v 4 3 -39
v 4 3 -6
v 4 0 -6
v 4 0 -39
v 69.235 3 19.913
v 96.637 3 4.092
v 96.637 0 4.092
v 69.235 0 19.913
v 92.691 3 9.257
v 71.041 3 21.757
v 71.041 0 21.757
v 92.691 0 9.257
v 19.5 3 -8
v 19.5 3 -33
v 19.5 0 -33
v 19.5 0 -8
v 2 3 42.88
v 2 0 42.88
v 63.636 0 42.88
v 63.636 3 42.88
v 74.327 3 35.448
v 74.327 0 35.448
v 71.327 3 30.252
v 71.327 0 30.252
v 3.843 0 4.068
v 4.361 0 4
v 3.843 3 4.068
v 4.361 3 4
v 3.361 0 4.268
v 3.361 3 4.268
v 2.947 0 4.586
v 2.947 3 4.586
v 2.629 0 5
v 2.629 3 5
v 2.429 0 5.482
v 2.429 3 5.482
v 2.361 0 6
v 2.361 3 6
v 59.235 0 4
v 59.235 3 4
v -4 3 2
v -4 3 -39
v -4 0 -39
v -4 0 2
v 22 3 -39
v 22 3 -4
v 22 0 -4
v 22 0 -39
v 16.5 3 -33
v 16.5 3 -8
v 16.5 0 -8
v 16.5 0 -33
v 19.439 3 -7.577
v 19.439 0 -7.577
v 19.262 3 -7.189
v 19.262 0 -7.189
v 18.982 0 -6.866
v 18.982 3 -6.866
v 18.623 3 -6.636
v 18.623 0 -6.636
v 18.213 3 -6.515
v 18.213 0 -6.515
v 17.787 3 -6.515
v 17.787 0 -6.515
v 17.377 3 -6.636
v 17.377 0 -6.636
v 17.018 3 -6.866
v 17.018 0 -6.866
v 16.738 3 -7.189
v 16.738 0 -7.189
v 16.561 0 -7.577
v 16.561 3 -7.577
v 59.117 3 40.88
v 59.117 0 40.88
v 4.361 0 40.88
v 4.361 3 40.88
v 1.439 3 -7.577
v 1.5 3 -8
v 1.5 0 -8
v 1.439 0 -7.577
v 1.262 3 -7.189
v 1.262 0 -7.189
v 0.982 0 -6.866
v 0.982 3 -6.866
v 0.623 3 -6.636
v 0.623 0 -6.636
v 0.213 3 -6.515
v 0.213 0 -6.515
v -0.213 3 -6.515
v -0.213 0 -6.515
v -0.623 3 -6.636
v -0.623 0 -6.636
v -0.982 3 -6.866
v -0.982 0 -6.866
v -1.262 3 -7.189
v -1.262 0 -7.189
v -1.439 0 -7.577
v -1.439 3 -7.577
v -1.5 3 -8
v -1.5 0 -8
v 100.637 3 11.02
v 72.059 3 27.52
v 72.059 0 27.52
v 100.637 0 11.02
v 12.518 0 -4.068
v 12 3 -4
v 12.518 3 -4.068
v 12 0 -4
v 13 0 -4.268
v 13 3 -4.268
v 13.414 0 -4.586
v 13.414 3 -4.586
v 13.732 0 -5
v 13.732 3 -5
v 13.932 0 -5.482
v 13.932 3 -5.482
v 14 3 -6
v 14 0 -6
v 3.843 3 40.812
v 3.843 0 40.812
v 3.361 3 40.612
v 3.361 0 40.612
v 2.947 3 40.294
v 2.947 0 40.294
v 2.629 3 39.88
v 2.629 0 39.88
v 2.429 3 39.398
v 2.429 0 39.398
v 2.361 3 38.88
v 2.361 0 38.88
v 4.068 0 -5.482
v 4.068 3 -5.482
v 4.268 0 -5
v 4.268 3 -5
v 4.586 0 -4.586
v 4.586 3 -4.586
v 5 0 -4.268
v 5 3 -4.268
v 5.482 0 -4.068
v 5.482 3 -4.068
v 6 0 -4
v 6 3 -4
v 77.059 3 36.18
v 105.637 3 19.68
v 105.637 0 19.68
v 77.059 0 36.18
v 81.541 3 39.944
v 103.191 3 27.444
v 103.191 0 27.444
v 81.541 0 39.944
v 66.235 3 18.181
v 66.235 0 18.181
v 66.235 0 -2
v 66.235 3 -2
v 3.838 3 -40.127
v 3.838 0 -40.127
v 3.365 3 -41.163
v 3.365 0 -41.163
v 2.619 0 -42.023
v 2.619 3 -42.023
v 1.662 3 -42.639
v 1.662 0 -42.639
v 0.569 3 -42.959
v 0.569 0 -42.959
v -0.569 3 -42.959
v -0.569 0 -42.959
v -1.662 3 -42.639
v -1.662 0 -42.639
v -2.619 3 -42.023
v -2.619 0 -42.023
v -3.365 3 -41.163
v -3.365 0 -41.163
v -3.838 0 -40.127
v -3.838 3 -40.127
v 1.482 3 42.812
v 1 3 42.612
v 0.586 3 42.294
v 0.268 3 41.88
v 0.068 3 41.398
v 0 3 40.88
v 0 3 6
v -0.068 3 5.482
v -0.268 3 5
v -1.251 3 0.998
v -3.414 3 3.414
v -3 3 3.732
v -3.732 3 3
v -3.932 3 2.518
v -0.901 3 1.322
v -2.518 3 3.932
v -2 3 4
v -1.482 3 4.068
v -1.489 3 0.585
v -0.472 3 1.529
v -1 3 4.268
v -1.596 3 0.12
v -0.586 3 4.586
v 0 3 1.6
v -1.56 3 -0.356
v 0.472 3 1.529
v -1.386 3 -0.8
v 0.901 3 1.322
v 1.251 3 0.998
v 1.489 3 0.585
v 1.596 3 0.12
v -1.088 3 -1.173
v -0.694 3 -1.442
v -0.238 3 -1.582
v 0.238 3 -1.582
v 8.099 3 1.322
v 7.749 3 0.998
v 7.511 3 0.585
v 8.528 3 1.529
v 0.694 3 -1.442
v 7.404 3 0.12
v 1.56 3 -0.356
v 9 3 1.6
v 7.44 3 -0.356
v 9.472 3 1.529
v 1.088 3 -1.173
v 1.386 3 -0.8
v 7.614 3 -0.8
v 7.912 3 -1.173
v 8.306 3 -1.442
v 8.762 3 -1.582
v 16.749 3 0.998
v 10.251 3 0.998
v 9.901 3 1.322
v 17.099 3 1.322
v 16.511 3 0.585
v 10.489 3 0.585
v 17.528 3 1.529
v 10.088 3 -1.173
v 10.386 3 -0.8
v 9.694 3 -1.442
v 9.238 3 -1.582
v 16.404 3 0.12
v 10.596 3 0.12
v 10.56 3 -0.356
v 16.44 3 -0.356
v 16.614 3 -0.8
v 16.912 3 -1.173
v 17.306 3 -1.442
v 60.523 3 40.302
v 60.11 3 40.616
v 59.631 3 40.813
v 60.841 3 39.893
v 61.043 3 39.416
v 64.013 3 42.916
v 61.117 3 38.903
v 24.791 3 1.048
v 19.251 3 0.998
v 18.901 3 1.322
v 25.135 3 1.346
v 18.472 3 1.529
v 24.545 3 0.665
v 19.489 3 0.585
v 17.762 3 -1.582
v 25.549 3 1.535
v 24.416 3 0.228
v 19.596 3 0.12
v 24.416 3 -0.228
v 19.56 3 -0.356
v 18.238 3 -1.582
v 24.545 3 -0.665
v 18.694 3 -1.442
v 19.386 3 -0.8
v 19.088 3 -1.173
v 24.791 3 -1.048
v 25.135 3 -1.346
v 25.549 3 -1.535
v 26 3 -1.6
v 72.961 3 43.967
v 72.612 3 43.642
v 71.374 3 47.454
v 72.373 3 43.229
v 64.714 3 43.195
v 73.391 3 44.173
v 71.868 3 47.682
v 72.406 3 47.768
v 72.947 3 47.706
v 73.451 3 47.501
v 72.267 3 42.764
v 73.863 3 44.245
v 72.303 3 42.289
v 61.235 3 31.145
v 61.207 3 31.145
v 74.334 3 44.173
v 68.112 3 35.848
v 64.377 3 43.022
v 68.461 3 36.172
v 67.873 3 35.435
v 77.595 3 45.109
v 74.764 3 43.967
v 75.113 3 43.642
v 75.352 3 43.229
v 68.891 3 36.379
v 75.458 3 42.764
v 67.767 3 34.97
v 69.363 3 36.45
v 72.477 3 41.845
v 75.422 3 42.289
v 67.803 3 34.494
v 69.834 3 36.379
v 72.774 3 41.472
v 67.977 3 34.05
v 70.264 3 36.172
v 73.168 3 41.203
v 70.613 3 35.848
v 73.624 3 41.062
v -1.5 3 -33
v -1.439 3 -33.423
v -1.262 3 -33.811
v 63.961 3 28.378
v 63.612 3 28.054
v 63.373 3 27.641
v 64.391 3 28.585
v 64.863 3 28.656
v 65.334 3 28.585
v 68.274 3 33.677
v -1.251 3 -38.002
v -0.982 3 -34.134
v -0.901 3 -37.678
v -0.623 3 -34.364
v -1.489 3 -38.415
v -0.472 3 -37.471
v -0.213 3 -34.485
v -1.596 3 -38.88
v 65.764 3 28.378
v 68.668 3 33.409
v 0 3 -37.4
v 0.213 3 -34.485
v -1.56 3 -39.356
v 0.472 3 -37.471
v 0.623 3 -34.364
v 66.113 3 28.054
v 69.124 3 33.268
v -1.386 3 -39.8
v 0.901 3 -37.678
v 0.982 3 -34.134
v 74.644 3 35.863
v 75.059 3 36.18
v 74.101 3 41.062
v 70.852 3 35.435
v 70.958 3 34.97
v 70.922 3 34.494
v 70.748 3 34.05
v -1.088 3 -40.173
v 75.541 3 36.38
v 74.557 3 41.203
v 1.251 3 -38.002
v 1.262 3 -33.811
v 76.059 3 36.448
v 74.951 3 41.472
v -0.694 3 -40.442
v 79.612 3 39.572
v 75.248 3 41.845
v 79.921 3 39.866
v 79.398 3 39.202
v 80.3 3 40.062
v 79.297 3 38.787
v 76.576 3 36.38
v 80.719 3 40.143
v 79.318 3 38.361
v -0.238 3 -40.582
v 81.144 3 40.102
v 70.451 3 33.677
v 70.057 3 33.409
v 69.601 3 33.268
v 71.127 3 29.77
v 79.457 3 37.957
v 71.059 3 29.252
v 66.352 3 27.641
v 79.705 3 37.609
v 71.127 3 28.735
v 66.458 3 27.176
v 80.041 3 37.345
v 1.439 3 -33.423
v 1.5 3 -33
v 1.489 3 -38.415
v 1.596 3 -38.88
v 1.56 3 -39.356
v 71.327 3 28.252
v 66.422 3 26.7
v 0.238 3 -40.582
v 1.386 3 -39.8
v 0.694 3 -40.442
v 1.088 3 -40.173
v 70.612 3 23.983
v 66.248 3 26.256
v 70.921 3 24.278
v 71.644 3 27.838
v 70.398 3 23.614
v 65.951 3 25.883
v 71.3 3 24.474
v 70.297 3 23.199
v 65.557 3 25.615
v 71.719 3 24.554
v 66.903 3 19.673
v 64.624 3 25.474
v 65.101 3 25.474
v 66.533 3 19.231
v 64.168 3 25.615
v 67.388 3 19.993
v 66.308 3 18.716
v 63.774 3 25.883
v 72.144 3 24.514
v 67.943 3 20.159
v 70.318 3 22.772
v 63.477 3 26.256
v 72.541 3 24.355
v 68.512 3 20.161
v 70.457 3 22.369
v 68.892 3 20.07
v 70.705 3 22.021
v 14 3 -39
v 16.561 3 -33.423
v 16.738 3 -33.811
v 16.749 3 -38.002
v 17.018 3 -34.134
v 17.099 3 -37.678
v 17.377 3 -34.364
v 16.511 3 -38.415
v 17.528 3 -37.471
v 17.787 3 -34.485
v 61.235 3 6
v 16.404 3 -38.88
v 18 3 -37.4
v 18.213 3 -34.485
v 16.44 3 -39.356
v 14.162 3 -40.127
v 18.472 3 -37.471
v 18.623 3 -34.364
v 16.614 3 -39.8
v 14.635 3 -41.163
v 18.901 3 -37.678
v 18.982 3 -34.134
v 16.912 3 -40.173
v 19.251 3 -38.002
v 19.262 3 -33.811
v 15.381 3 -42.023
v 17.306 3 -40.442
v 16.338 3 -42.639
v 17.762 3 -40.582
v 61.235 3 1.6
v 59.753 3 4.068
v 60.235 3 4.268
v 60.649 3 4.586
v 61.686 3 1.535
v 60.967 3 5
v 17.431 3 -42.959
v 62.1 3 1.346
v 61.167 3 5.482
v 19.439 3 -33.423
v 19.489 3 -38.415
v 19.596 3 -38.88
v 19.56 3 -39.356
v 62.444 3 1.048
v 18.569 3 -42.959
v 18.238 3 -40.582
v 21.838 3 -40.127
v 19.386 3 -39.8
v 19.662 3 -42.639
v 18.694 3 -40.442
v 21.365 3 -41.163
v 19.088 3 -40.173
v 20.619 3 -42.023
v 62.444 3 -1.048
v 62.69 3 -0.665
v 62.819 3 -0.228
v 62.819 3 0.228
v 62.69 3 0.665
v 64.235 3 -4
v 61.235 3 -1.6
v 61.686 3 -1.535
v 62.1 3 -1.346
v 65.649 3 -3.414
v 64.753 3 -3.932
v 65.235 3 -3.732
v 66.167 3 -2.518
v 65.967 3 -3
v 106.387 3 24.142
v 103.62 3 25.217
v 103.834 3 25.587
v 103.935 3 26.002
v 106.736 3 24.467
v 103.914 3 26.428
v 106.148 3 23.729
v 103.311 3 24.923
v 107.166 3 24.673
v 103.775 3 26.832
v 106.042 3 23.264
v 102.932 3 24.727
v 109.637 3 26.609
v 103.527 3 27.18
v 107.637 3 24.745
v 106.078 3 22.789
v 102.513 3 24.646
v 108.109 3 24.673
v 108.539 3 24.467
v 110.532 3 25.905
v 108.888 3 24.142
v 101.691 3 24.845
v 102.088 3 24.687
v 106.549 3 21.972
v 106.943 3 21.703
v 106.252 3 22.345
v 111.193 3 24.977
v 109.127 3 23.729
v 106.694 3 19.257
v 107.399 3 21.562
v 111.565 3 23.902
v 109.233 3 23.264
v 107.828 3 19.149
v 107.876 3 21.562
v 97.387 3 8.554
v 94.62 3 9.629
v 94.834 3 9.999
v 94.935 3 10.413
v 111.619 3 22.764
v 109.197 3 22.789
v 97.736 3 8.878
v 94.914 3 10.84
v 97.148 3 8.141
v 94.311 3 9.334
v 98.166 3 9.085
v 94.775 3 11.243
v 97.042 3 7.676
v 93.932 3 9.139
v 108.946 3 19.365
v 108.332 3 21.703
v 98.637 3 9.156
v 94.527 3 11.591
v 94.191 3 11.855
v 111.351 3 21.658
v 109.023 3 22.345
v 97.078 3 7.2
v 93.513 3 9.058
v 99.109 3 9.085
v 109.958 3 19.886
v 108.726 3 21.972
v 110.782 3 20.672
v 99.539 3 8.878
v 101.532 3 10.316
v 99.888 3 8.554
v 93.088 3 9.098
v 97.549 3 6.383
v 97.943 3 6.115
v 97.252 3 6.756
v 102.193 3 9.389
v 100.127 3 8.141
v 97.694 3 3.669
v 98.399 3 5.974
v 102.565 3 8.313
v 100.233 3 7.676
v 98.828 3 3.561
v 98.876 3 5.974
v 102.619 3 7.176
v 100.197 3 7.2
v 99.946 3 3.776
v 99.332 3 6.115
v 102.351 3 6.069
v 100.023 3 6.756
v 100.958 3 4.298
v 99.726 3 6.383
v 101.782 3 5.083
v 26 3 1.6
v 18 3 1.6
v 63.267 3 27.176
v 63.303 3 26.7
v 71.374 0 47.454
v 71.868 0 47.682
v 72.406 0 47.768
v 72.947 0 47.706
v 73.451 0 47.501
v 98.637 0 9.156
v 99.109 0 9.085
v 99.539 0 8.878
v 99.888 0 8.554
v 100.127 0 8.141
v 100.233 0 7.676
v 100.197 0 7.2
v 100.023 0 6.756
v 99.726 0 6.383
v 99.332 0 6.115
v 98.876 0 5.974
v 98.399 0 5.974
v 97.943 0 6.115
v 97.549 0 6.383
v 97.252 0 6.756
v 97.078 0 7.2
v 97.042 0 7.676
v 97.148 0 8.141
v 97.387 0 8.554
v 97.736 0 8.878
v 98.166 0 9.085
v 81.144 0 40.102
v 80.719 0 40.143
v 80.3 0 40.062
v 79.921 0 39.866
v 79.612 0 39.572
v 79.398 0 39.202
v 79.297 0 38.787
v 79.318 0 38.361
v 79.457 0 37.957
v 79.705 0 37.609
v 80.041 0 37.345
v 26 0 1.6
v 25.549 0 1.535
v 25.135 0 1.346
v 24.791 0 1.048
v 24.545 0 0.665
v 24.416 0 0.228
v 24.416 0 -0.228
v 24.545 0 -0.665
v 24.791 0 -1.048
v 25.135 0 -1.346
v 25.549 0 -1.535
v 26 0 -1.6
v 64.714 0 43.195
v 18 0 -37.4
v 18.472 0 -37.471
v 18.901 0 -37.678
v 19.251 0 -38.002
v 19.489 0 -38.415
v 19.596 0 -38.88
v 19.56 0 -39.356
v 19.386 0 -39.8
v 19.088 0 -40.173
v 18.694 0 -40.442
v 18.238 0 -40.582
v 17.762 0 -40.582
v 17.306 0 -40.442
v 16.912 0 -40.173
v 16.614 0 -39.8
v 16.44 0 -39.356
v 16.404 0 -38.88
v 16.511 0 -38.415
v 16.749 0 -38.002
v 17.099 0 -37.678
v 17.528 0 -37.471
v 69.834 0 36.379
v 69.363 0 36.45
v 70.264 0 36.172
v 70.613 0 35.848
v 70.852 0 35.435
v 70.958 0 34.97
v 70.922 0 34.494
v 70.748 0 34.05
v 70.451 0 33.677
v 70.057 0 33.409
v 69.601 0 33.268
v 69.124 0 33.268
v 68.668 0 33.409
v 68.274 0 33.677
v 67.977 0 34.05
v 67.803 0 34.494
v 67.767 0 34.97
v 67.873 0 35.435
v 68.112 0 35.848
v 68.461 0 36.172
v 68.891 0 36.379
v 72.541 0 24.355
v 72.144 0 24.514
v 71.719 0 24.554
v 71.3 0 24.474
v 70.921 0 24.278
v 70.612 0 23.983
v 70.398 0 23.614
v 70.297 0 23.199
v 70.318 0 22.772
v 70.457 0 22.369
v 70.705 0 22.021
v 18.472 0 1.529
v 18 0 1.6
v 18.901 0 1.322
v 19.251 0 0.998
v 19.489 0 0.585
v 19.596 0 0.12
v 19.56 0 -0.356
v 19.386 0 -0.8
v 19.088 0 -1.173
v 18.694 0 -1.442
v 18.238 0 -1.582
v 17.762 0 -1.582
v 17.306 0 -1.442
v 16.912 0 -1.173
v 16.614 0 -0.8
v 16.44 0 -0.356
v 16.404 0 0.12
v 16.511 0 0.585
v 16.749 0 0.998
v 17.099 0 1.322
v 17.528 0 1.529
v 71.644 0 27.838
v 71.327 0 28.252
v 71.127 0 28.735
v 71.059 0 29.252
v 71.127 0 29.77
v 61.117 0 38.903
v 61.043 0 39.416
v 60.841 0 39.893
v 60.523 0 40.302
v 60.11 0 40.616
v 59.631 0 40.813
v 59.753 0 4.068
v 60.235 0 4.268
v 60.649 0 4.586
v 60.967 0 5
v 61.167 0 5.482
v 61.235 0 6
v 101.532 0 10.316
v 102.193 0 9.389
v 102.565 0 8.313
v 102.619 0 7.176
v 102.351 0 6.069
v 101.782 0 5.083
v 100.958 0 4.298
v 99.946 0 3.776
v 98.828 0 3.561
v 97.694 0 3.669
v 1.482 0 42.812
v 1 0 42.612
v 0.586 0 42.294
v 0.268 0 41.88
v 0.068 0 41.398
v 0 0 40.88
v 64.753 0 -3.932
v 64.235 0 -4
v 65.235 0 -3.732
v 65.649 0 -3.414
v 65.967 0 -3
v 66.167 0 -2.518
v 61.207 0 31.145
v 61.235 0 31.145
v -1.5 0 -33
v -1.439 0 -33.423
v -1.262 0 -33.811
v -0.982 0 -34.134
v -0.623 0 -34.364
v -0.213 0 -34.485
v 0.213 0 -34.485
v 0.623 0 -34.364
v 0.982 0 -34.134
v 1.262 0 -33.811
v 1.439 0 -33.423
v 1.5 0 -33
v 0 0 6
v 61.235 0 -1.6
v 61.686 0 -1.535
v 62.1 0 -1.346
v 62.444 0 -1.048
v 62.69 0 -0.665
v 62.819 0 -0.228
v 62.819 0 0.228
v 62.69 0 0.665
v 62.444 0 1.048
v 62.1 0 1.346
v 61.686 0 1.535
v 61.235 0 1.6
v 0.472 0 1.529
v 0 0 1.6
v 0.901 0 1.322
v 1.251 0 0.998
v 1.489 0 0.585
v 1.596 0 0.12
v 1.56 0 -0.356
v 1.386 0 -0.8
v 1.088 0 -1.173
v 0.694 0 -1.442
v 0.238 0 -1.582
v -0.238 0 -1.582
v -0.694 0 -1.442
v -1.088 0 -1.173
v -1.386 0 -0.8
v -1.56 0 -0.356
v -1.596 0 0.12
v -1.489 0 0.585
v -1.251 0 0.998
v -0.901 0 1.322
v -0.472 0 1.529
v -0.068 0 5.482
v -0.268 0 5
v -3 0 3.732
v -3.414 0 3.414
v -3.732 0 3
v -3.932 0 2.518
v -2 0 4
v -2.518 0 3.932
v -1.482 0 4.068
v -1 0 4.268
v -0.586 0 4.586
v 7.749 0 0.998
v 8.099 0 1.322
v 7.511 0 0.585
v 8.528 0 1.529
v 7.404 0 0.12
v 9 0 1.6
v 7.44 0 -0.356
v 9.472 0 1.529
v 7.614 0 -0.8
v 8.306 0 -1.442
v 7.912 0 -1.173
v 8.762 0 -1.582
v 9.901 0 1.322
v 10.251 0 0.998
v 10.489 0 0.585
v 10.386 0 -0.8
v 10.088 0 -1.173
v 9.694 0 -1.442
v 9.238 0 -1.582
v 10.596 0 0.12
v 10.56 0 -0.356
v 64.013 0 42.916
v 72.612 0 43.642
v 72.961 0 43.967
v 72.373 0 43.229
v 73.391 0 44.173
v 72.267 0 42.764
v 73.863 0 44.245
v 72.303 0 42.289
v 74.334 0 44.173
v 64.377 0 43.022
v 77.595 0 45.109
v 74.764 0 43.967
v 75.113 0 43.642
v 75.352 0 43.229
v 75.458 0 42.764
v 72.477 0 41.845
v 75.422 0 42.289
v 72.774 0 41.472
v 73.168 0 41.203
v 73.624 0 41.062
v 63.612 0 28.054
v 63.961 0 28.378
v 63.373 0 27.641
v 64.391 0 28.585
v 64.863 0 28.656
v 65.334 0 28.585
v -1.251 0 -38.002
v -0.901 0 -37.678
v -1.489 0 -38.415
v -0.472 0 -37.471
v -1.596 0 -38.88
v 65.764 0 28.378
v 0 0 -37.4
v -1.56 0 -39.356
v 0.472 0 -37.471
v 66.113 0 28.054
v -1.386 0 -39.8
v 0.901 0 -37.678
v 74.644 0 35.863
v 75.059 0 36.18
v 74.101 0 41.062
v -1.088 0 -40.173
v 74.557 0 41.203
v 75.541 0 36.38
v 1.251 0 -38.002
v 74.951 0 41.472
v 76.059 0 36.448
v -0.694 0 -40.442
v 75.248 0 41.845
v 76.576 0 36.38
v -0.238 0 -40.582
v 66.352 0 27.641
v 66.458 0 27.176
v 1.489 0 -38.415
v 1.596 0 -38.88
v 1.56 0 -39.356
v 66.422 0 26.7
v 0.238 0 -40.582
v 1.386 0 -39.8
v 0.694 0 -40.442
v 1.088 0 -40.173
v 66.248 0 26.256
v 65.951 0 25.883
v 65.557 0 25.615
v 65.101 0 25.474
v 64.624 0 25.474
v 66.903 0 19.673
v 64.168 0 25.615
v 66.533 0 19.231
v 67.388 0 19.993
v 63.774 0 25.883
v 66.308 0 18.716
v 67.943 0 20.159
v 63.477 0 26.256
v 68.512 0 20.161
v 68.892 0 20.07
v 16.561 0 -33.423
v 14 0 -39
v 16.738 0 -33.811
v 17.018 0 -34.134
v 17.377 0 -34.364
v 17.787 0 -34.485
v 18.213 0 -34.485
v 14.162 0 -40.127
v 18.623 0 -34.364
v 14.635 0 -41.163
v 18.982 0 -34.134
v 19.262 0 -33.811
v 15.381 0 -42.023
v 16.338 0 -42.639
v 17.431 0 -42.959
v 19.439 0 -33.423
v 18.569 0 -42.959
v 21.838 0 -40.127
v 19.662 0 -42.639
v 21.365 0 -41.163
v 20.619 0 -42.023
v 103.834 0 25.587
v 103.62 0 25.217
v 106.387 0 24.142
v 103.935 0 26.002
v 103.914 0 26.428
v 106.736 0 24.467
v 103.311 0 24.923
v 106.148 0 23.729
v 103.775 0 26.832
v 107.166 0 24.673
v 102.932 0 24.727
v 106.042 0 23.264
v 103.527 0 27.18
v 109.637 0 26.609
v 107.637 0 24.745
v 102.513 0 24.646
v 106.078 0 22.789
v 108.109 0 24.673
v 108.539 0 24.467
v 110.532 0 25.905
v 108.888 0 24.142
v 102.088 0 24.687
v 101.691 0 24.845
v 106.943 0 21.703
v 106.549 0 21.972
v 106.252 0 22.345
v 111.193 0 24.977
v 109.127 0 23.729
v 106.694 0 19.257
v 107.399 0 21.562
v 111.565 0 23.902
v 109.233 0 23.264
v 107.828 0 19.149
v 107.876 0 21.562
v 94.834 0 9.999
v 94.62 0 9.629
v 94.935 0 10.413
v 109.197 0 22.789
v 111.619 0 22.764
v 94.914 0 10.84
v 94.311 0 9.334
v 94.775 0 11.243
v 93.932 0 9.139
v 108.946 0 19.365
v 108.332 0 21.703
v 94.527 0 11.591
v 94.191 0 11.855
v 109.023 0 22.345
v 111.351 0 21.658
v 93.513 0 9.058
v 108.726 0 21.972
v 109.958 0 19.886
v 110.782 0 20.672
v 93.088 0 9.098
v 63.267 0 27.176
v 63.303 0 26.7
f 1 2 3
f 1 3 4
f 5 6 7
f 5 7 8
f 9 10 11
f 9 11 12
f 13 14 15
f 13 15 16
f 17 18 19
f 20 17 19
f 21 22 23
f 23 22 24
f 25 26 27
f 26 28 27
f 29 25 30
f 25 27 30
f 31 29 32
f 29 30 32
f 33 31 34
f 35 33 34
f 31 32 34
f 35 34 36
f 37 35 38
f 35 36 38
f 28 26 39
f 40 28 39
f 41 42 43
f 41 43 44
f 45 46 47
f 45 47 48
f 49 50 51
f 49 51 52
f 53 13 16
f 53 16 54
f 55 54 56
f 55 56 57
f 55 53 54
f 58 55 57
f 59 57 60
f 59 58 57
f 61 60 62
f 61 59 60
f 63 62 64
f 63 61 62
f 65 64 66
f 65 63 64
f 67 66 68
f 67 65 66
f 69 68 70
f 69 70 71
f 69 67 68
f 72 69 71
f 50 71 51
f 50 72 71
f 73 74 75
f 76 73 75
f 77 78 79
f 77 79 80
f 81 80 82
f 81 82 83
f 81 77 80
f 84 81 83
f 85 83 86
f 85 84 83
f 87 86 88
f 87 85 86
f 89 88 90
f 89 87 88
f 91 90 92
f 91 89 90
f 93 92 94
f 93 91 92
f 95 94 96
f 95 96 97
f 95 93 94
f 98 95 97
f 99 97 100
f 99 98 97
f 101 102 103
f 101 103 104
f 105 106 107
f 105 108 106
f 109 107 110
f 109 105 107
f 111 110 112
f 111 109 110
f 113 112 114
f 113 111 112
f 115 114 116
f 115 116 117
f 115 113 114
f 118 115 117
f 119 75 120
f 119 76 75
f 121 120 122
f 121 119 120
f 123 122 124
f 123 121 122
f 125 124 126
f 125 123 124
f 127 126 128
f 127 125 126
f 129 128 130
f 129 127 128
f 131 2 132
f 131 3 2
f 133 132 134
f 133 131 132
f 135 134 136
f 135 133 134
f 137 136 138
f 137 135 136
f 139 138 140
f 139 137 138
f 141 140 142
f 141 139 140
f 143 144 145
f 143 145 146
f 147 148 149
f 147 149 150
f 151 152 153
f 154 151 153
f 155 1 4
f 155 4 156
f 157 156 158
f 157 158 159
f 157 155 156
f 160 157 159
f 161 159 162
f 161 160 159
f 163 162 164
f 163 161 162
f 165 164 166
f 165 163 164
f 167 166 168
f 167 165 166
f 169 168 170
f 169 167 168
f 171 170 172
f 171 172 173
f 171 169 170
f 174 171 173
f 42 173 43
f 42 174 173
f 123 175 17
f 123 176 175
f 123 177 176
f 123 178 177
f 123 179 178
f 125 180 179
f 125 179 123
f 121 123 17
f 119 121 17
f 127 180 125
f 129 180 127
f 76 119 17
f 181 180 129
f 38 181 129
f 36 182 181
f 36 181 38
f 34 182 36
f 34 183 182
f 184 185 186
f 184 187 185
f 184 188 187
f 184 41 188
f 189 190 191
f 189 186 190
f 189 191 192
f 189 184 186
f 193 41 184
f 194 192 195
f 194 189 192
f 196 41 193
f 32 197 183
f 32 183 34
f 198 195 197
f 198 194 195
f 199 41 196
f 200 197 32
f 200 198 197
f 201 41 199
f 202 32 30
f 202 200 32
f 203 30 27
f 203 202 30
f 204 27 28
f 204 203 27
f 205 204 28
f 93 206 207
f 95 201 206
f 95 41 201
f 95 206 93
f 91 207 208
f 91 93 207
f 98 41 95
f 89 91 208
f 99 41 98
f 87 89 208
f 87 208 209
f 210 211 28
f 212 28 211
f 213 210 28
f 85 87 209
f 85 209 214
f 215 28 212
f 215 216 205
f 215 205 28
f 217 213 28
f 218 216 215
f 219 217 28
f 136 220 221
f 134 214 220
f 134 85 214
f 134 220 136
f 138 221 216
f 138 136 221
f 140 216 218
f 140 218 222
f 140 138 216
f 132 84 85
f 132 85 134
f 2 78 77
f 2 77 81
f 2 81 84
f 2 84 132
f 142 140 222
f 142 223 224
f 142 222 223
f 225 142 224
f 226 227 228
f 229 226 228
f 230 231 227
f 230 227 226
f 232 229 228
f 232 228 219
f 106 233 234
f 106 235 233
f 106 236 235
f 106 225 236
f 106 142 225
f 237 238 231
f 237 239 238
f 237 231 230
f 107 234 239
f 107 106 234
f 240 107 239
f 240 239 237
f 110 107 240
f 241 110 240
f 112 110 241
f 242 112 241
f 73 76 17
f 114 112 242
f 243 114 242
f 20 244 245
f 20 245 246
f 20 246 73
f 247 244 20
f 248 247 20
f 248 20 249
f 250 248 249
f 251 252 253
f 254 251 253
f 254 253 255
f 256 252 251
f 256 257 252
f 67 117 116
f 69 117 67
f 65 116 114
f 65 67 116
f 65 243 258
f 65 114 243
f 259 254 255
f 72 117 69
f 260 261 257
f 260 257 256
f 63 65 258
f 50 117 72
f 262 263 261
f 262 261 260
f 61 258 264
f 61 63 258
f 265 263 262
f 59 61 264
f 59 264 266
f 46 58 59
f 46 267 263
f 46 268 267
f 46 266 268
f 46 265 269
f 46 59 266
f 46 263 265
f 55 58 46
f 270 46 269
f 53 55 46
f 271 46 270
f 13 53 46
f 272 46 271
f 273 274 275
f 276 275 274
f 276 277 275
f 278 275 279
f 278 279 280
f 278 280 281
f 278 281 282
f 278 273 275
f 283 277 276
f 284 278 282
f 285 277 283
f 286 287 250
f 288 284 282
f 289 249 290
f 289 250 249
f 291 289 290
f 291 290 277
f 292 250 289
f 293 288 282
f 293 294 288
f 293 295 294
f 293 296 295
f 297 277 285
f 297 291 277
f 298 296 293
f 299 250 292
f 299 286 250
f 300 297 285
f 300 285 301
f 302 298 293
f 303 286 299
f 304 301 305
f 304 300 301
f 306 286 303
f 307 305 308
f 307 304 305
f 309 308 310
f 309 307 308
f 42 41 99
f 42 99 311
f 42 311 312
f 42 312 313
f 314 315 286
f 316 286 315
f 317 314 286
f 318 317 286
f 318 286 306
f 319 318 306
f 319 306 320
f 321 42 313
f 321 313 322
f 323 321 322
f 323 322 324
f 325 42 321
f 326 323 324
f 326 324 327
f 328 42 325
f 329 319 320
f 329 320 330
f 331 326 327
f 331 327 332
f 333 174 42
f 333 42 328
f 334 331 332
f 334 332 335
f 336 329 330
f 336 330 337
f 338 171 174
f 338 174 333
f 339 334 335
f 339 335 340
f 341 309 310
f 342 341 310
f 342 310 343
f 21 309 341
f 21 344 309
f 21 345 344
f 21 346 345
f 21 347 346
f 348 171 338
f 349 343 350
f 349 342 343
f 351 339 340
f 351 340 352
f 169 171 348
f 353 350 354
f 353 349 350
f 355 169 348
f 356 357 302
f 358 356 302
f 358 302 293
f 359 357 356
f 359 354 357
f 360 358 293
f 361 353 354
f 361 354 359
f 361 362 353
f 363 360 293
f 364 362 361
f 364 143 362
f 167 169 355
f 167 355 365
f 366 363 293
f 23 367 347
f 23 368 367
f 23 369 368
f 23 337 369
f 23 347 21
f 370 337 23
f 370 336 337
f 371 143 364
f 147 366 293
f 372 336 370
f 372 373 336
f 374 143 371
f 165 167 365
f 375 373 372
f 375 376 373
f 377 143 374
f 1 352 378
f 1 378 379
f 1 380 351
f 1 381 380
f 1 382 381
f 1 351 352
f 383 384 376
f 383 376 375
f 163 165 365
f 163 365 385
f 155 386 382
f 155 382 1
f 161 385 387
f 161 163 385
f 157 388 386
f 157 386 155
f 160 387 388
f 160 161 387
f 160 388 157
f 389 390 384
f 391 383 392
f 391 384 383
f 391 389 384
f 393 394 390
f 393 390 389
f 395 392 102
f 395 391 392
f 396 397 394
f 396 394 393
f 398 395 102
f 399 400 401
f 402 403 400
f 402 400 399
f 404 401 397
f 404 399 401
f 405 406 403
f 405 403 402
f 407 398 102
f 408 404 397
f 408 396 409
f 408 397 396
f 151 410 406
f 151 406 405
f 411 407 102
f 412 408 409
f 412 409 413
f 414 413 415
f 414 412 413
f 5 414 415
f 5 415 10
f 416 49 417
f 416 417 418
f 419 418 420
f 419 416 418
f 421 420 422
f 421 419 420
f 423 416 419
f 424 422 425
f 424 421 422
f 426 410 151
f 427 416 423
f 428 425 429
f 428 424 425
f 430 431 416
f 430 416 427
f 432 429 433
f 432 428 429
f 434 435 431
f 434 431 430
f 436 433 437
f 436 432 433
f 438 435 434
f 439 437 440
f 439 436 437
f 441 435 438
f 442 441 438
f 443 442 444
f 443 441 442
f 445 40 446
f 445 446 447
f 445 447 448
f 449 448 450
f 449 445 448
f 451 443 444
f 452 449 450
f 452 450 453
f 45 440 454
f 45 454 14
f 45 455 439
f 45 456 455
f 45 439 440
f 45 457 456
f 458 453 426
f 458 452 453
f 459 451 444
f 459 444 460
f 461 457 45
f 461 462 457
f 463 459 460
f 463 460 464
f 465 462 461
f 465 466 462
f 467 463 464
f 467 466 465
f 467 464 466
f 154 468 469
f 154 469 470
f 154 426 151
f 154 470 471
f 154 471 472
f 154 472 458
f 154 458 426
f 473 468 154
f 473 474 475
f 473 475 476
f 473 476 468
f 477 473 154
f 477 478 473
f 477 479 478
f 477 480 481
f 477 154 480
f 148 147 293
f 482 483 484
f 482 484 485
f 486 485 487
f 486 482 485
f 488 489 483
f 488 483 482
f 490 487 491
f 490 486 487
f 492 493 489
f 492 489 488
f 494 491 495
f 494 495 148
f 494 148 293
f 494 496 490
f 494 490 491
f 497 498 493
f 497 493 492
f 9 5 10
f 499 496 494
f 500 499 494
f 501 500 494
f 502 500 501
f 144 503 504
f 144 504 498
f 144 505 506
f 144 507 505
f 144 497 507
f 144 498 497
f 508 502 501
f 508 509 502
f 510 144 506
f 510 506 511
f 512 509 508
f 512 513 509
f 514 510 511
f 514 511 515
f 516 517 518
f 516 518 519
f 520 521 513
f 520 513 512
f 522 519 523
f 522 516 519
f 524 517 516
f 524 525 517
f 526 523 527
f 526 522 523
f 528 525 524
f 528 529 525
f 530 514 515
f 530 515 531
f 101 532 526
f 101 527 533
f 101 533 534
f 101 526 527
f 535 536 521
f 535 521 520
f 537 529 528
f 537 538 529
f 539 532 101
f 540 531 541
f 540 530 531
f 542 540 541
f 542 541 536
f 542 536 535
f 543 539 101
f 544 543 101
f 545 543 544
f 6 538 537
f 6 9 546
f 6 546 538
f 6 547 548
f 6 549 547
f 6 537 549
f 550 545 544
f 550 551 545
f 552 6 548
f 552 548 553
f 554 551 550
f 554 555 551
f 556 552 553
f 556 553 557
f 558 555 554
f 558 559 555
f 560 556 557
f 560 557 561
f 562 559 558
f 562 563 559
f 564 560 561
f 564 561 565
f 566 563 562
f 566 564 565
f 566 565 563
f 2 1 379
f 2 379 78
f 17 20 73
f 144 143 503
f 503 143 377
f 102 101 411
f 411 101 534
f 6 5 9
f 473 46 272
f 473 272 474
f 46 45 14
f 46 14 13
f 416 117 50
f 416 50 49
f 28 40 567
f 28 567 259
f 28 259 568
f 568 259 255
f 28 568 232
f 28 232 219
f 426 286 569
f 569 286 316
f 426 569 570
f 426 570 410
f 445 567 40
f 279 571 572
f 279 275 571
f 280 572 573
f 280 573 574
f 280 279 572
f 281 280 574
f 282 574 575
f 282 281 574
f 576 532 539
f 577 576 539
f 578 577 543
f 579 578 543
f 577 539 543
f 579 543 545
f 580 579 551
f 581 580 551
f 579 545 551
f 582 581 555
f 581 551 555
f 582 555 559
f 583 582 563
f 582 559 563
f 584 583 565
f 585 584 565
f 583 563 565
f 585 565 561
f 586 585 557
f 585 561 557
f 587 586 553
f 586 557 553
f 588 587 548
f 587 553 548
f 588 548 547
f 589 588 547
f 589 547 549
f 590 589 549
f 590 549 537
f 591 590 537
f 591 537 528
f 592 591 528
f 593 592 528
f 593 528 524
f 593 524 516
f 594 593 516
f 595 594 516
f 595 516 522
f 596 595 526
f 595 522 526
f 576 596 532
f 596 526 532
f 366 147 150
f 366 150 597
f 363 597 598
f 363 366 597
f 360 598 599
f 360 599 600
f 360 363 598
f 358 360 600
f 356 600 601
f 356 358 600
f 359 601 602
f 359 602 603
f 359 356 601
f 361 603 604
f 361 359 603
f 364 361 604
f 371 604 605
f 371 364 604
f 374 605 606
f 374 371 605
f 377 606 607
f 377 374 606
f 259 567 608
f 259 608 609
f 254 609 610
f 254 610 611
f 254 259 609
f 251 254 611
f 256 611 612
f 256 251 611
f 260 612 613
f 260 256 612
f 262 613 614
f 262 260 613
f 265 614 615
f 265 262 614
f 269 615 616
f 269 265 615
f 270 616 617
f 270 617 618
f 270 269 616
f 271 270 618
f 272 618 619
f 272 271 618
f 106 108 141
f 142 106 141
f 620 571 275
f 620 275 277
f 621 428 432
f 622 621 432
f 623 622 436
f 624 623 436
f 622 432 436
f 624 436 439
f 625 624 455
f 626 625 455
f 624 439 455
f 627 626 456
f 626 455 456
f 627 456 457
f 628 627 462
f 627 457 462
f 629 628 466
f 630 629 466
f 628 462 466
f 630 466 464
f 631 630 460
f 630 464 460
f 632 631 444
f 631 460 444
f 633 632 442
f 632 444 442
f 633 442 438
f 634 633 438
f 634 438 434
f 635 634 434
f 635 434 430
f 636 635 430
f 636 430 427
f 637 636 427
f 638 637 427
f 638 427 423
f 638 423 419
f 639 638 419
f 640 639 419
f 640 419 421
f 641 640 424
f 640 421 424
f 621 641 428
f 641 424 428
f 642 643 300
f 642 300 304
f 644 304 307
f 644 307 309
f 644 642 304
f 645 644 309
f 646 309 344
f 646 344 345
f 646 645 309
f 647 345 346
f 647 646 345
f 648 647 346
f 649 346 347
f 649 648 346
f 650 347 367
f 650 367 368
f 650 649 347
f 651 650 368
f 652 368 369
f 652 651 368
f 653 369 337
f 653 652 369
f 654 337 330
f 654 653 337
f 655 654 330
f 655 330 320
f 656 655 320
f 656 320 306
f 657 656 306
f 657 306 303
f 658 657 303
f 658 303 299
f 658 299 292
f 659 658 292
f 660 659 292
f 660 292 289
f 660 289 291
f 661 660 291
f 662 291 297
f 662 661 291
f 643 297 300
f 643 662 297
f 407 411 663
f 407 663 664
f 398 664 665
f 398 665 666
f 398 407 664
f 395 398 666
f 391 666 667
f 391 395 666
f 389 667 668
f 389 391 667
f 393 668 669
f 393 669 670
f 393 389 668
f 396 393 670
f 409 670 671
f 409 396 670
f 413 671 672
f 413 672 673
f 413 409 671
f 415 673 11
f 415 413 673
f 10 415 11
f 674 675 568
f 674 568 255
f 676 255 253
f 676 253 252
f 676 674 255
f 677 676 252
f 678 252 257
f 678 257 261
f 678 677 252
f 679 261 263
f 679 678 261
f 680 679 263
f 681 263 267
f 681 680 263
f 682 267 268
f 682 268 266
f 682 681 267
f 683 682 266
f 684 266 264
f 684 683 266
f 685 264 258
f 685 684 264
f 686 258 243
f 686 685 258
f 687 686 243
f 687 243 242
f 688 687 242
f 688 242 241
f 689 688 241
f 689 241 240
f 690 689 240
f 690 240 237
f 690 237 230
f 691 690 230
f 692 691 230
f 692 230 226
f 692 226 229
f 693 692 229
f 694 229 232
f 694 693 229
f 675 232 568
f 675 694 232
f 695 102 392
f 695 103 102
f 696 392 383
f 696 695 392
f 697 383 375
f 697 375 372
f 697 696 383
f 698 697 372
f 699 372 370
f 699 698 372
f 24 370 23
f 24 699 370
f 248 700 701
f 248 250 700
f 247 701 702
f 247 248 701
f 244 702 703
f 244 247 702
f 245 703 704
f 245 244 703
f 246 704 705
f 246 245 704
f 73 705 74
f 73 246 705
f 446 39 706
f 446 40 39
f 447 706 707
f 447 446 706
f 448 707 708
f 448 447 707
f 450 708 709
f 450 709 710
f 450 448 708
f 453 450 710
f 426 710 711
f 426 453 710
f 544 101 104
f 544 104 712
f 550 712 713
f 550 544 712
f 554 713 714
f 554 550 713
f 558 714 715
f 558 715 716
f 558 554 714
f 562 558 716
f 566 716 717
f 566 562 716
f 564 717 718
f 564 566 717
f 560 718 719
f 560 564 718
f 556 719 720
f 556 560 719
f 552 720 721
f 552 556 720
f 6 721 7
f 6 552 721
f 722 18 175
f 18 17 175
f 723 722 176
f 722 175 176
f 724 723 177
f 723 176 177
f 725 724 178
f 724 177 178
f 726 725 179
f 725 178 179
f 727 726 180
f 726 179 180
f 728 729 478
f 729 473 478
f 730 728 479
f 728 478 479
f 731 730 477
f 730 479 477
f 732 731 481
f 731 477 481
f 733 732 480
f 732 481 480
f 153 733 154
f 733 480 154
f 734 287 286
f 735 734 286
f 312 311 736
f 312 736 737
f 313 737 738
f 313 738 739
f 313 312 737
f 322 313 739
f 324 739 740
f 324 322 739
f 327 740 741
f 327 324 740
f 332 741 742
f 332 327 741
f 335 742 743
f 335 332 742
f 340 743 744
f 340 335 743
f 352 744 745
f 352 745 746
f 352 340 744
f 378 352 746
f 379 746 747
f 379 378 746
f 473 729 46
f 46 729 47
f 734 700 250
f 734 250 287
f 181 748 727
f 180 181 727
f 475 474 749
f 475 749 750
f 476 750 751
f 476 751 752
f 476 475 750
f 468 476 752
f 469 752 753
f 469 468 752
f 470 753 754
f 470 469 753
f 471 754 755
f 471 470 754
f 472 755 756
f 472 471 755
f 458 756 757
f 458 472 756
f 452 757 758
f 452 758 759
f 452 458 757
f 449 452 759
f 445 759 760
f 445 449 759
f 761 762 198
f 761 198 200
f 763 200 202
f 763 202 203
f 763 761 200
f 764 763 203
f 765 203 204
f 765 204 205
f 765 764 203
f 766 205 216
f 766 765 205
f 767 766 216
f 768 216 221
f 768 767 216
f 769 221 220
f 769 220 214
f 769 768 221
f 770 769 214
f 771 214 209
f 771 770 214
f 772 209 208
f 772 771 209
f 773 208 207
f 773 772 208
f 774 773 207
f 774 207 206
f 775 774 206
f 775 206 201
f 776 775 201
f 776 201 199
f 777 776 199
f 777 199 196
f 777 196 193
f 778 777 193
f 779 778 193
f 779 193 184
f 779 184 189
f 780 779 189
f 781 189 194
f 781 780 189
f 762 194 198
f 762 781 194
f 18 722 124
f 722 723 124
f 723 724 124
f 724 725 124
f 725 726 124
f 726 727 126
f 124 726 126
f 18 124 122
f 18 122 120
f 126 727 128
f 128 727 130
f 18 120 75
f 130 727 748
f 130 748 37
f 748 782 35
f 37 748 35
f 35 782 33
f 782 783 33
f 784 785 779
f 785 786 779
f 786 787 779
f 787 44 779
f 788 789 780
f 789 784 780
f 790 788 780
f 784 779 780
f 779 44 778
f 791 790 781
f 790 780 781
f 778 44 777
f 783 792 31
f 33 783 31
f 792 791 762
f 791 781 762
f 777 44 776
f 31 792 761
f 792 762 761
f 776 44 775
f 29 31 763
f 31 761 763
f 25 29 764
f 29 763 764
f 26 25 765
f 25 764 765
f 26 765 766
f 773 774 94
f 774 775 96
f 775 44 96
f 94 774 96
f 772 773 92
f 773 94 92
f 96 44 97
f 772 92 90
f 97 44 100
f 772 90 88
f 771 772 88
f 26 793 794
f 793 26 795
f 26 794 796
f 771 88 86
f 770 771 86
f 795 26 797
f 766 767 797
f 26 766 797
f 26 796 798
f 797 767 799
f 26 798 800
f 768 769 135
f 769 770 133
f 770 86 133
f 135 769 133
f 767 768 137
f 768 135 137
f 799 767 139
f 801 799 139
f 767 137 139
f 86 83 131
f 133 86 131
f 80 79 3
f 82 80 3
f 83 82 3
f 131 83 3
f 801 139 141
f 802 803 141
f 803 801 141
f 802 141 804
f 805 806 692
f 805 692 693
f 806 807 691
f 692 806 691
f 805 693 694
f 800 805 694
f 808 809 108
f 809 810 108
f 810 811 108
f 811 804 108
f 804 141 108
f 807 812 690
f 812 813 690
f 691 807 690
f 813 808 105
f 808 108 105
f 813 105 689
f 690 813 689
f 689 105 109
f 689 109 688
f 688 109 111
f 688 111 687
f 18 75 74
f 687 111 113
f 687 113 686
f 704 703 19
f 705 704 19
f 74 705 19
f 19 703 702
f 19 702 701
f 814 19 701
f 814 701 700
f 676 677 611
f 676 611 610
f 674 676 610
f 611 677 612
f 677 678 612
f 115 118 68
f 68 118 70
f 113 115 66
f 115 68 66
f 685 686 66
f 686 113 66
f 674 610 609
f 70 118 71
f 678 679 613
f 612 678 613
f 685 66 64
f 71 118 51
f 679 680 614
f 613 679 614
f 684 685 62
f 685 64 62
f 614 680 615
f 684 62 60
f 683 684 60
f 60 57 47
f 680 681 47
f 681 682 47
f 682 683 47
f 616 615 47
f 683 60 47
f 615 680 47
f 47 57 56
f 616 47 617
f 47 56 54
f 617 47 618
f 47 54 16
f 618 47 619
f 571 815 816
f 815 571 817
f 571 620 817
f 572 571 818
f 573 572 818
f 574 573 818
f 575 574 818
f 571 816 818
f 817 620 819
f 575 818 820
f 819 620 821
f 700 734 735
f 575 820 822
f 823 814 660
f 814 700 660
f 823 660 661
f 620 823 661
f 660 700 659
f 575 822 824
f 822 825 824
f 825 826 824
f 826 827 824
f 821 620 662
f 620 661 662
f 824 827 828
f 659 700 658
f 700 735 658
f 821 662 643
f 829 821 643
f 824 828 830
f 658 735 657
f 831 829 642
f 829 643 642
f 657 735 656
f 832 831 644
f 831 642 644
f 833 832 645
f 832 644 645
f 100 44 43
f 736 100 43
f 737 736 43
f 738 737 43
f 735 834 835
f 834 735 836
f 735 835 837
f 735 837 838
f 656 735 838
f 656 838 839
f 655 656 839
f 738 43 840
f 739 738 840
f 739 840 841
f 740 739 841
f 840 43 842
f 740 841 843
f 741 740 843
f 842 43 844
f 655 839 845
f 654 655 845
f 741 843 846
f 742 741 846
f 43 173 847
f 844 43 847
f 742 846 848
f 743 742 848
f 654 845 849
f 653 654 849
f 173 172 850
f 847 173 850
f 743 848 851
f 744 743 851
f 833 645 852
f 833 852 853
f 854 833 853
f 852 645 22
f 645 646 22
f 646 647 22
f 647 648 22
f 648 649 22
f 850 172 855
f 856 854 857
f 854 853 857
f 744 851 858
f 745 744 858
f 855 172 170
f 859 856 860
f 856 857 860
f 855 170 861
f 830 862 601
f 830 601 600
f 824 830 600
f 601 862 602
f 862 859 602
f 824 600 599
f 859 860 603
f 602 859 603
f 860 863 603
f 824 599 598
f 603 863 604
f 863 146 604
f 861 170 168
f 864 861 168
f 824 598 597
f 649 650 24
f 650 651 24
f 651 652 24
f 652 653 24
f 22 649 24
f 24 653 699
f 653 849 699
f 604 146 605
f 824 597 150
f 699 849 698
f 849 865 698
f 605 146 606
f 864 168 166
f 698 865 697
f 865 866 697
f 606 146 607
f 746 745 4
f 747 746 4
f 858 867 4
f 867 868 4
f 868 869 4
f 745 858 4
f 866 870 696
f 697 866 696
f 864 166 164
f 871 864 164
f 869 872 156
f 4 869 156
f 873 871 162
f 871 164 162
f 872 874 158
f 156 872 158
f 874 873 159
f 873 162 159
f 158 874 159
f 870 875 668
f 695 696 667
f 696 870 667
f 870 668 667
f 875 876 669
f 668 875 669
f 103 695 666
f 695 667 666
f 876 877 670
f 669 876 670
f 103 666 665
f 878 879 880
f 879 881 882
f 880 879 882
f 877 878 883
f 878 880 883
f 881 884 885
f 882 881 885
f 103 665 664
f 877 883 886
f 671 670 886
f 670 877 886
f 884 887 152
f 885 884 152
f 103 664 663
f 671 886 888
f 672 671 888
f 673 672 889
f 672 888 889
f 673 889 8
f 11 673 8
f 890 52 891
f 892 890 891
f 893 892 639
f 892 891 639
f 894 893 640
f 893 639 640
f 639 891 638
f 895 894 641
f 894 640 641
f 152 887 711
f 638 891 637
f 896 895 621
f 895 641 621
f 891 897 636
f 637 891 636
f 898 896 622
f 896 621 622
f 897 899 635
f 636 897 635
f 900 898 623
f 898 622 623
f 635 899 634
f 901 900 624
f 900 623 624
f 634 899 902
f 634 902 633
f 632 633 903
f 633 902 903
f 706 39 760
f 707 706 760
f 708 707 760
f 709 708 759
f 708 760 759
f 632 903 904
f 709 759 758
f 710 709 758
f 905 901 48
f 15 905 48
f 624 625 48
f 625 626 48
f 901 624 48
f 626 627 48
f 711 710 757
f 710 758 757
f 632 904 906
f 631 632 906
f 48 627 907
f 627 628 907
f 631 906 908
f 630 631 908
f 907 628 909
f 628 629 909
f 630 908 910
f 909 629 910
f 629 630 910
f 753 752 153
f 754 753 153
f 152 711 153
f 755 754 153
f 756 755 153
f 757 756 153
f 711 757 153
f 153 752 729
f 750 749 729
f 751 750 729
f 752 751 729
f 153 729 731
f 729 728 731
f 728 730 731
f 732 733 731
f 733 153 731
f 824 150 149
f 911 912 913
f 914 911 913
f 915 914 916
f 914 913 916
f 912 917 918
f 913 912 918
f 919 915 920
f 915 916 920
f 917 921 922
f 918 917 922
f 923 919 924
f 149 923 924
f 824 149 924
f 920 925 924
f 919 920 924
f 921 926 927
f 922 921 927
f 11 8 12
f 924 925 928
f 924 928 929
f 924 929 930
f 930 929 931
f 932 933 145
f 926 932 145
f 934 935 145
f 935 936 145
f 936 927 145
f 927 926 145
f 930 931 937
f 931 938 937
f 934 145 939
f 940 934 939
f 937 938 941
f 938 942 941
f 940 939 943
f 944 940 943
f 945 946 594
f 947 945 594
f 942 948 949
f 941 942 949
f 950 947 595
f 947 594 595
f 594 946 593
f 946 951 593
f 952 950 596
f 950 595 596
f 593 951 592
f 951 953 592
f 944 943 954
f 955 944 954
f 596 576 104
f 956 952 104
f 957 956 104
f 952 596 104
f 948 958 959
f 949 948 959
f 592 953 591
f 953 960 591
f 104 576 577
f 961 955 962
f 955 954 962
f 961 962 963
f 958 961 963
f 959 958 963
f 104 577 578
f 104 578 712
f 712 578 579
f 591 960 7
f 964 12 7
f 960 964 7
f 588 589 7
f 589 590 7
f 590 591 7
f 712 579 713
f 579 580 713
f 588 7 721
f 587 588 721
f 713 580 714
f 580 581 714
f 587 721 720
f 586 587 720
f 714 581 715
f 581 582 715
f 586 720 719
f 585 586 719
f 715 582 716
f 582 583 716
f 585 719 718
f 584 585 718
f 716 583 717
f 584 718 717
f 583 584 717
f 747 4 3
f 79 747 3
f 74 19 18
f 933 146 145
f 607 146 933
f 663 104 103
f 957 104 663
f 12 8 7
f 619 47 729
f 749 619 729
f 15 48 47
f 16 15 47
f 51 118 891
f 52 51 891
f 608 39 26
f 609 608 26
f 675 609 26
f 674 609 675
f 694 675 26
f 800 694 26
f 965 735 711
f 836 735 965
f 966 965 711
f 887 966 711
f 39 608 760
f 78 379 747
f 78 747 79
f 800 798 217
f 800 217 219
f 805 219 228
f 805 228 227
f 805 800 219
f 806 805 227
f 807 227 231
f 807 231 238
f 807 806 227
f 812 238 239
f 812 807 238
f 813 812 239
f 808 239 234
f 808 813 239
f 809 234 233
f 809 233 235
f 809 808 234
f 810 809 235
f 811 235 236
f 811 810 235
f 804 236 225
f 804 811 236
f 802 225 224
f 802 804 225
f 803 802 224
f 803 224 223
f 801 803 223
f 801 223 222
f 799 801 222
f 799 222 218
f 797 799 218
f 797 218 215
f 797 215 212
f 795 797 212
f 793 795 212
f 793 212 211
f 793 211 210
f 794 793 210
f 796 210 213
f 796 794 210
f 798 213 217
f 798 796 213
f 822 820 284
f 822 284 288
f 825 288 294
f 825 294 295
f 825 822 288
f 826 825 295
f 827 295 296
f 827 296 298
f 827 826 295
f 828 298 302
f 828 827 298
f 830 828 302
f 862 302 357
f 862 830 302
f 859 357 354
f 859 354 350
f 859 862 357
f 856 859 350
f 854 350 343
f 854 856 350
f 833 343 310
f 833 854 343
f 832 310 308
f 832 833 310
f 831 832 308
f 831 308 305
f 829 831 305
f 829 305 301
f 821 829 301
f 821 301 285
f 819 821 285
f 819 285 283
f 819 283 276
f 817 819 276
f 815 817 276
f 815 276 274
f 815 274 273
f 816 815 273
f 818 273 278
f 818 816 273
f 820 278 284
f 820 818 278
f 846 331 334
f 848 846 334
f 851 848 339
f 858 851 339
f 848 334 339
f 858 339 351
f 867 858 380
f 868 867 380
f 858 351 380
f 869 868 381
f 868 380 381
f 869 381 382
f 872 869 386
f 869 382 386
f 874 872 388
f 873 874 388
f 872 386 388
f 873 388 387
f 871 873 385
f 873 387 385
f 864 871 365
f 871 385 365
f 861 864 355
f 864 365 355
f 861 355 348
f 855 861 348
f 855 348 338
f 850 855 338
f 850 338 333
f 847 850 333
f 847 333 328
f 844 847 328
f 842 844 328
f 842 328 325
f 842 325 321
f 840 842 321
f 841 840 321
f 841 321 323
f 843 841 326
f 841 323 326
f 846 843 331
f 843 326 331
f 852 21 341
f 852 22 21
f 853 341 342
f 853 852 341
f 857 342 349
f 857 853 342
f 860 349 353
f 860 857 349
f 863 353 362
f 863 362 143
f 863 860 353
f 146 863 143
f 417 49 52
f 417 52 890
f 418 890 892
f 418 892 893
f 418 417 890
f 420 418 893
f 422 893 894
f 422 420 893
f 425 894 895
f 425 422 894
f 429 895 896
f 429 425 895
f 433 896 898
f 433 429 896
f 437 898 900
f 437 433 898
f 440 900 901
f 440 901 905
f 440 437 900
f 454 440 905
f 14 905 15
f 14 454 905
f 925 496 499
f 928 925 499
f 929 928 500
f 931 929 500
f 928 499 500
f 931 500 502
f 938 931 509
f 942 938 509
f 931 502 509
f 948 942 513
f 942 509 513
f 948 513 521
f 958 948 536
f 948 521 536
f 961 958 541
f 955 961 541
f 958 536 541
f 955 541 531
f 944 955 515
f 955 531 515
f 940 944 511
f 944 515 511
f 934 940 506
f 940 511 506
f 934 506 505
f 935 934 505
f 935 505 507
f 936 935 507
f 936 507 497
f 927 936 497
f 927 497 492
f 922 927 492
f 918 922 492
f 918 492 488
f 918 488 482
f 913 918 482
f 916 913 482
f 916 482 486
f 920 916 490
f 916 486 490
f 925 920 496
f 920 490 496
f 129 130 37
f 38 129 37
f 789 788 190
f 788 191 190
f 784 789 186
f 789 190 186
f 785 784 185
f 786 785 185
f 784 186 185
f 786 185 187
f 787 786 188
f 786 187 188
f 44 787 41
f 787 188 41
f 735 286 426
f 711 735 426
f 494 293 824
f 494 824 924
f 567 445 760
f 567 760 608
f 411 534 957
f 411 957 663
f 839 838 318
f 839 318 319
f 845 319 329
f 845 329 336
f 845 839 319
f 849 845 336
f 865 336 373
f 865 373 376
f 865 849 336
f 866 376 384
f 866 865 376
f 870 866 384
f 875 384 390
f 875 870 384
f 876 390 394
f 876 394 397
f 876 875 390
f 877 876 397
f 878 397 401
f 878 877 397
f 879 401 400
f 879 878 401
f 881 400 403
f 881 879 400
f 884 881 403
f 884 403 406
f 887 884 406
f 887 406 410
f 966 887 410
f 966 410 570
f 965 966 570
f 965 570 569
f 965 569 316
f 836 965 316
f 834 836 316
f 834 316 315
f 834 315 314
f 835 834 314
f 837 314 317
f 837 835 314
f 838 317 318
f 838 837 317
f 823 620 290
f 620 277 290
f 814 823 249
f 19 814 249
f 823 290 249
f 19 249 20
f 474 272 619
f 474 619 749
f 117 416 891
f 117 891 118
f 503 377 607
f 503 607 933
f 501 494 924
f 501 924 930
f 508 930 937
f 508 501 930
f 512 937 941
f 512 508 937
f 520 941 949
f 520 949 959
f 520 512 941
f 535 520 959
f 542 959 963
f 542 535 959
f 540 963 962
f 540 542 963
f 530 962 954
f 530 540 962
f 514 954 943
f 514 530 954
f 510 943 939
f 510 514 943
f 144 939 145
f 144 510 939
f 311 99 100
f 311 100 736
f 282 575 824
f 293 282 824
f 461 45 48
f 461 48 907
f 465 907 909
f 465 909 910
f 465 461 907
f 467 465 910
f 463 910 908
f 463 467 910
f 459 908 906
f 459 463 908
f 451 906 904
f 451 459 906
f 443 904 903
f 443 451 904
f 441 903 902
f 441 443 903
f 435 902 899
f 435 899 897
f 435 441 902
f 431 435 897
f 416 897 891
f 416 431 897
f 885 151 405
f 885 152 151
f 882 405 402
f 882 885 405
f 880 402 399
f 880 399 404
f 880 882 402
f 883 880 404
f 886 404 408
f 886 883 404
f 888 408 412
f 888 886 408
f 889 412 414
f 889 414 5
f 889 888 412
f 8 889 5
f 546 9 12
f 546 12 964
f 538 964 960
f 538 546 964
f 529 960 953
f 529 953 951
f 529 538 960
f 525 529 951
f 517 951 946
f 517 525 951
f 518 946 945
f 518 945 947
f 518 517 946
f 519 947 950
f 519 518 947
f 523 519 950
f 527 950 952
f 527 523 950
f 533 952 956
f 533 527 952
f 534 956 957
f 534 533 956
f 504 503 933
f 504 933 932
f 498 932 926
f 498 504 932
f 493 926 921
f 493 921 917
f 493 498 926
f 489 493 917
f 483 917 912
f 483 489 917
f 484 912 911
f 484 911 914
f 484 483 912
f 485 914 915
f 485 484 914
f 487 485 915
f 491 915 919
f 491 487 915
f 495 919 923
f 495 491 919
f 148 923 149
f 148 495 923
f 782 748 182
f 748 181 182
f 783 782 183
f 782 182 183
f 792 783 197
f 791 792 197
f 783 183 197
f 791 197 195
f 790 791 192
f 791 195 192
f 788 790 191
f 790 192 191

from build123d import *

# Parameters (mm, degrees)
SKETCH1_R           = 1.6
BOSS_EXTRUDE1_DEPTH = 3
FILLET1_R           = 2
FILLET2_R           = 2
CUT_EXTRUDE1_DEPTH  = 3
BOSS_EXTRUDE2_DEPTH = 3
SKETCH5_W           = 5.72828372
SKETCH5_H           = 7.781232697
CUT_EXTRUDE2_DEPTH  = 3
SKETCH6_R           = 1.6
CUT_EXTRUDE3_DEPTH  = 3
FILLET3_R           = 2
CUT_EXTRUDE4_DEPTH  = 3


with BuildPart() as part:
    # Sketch1 → Boss-Extrude1 (new body)
    # profile 1 of 3: a face of its own
    with BuildSketch(Plane(origin=(0, 0, 0), x_dir=(1, 0, 0), z_dir=(0, 1, 0))):
        Polygon((66.235042478, 4), (-4, 4), (-4, -4), (61.235042478, -4), (61.235042478, -28.773130918), (72.398403011, -48.108638544), (79.326606241, -44.108638544), (66.235042478, -21.433384956), align=None)
        with Locations(Location((18, 0, 0), (0, 0, 270))):
            Circle(SKETCH1_R, mode=Mode.SUBTRACT)
        with Locations(Location((9, 0, 0), (0, 0, 270))):
            Circle(SKETCH1_R, mode=Mode.SUBTRACT)
        with Locations(Location((0, 0, 0), (0, 0, 270))):
            Circle(SKETCH1_R, mode=Mode.SUBTRACT)
        with Locations(Location((64.862504626, -27.056079661, 0), (0, 0, 270))):
            Circle(SKETCH1_R, mode=Mode.SUBTRACT)
        with Locations(Location((69.362504626, -34.850308295, 0), (0, 0, 270))):
            Circle(SKETCH1_R, mode=Mode.SUBTRACT)
        with Locations(Location((73.862504626, -42.644536929, 0), (0, 0, 270))):
            Circle(SKETCH1_R, mode=Mode.SUBTRACT)
    # profile 2 of 3: a face of its own
    with BuildSketch(Plane(origin=(0, 0, 0), x_dir=(1, 0, 0), z_dir=(0, 1, 0))):
        Polygon((2.360744243, -4), (0, -4), (0, -42.879937828), (64.221215797, -42.879937828), (61.09340732, -40.879937828), (2.360744243, -40.879937828), align=None)
    # profile 3 of 3: a face of its own
    with BuildSketch(Plane(origin=(0, 0, 0), x_dir=(1, 0, 0), z_dir=(0, 1, 0))):
        Polygon((61.235042478, -28.773130918), (72.398403011, -48.108638544), (61.09340732, -40.879937828), align=None)
    extrude(amount=BOSS_EXTRUDE1_DEPTH)

    # Fillet1
    fillet1_edges = [part.edges().sort_by_distance(p)[0] for p in [
        (61.235042478, 1.5, 28.773130918),
        (61.235042478, 1.5, 4),
        (2.360744243, 1.5, 4),
        (2.360744243, 1.5, 40.879937828),
        (61.09340732, 1.5, 40.879937828),
    ]]
    fillet(fillet1_edges, radius=FILLET1_R)

    # Fillet2
    fillet2_edges = [part.edges().sort_by_distance(p)[0] for p in [
        (0, 1.5, 4),
        (-4, 1.5, 4),
        (-4, 1.5, -4),
        (66.235042478, 1.5, -4),
        (66.235042478, 1.5, 21.433384956),
        (79.326606241, 1.5, 44.108638544),
        (72.398403011, 1.5, 48.108638544),
        (64.221215797, 1.5, 42.879937828),
        (0, 1.5, 42.879937828),
    ]]
    fillet(fillet2_edges, radius=FILLET2_R - 0.0001)  # a hair under: the kernel refuses the full size

    # Sketch2 → Cut-Extrude1 (cut)
    with BuildSketch(Plane(origin=(0, 3, 0), x_dir=(1, 0, 0), z_dir=(0, 1, 0))):
        with BuildLine():
            Line((26, 1.6), (61.235042478, 1.6))
            ThreePointArc((61.235042478, 1.6), (62.835042478, 0), (61.235042478, -1.6))
            Line((61.235042478, -1.6), (26, -1.6))
            ThreePointArc((26, -1.6), (24.4, 0), (26, 1.6))
        make_face()
    extrude(amount=-CUT_EXTRUDE1_DEPTH, mode=Mode.SUBTRACT)

    # Sketch4 → Boss-Extrude2 (add)
    with BuildSketch(Plane(origin=(0, 3, 0), x_dir=(1, 0, 0), z_dir=(0, 1, 0))):
        with BuildLine():
            Line((-2.0001, 4), (4, 4))
            Line((4, 4), (4, 39))
            ThreePointArc((4, 39), (0, 43), (-4, 39))
            Line((-4, 39), (-4, 2.0001))
            ThreePointArc((-4, 2.0001), (-3.414242852, 3.414242852), (-2.0001, 4))
        make_face()
        with BuildLine():
            Line((14, 39), (14, 4))
            Line((14, 4), (22, 4))
            Line((22, 4), (22, 39))
            ThreePointArc((22, 39), (18, 43), (14, 39))
        make_face()
        with BuildLine():
            Line((96.637495374, -4.091978046), (66.35375998, -21.576300827))
            ThreePointArc((66.35375998, -21.576300827), (66.421246357, -21.740191472), (66.502978273, -21.897463366))
            Line((66.502978273, -21.897463366), (70.326606241, -28.520181276))
            Line((70.326606241, -28.520181276), (100.637495374, -11.020181276))
            ThreePointArc((100.637495374, -11.020181276), (102.101596989, -5.556079661), (96.637495374, -4.091978046))
        make_face()
        with BuildLine():
            Line((105.637495374, -19.680435314), (75.326606241, -37.180435314))
            Line((75.326606241, -37.180435314), (78.326656241, -42.376674339))
            ThreePointArc((78.326656241, -42.376674339), (78.526447096, -43.894236547), (77.594642036, -45.108588544))
            Line((77.594642036, -45.108588544), (109.637495374, -26.608638544))
            ThreePointArc((109.637495374, -26.608638544), (111.101596989, -21.144536929), (105.637495374, -19.680435314))
        make_face()
    extrude(amount=-BOSS_EXTRUDE2_DEPTH)

    # Sketch5 → Cut-Extrude2 (cut)
    with BuildSketch(Plane(origin=(0, 3, 0), x_dir=(1, 0, 0), z_dir=(0, 1, 0))):
        with Locations((58.370900618, -27.25388929)):
            Rectangle(SKETCH5_W, SKETCH5_H)
    extrude(amount=-CUT_EXTRUDE2_DEPTH, mode=Mode.SUBTRACT)

    # Sketch6 → Cut-Extrude3 (cut)
    with BuildSketch(Plane(origin=(0, 3, 0), x_dir=(1, 0, 0), z_dir=(0, 1, 0))):
        with Locations(Location((0, 39, 0), (0, 0, 270))):
            Circle(SKETCH6_R)
        with Locations(Location((18, 39, 0), (0, 0, 270))):
            Circle(SKETCH6_R)
        with Locations(Location((98.637495374, -7.556079661, 0), (0, 0, 270))):
            Circle(SKETCH6_R)
        with Locations(Location((107.637495374, -23.144536929, 0), (0, 0, 270))):
            Circle(SKETCH6_R)
    extrude(amount=-CUT_EXTRUDE3_DEPTH, mode=Mode.SUBTRACT)

    # Fillet3
    fillet3_edges = [part.edges().sort_by_distance(p)[0] for p in [
        (14, 1.5, -4),
        (4, 1.5, -4),
        (75.326606241, 1.5, 37.180435314),
        (70.326606241, 1.5, 28.520181276),
        (66.35375998, 1.5, 21.576300827),
    ]]
    fillet(fillet3_edges, radius=FILLET3_R)

    # Sketch8 → Cut-Extrude4 (cut)
    with BuildSketch(Plane(origin=(0, 3, 0), x_dir=(1, 0, 0), z_dir=(0, 1, 0))):
        with BuildLine():
            Line((1.5, 33), (1.5, 8))
            ThreePointArc((1.5, 8), (0, 6.5), (-1.5, 8))
            Line((-1.5, 8), (-1.5, 33))
            ThreePointArc((-1.5, 33), (0, 34.5), (1.5, 33))
        make_face()
        with BuildLine():
            Line((19.5, 33), (19.5, 8))
            ThreePointArc((19.5, 8), (18, 6.5), (16.5, 8))
            Line((16.5, 8), (16.5, 33))
            ThreePointArc((16.5, 33), (18, 34.5), (19.5, 33))
        make_face()
        with BuildLine():
            Line((94.191342951, -11.855117767), (72.540707856, -24.355117767))
            ThreePointArc((72.540707856, -24.355117767), (70.491669751, -23.806079661), (71.040707856, -21.757041555))
            Line((71.040707856, -21.757041555), (92.691342951, -9.257041555))
            ThreePointArc((92.691342951, -9.257041555), (94.740381057, -9.806079661), (94.191342951, -11.855117767))
        make_face()
        with BuildLine():
            Line((103.191342951, -27.443575035), (81.540707856, -39.943575035))
            ThreePointArc((81.540707856, -39.943575035), (79.491669751, -39.394536929), (80.040707856, -37.345498823))
            Line((80.040707856, -37.345498823), (101.691342951, -24.845498823))
            ThreePointArc((101.691342951, -24.845498823), (103.740381057, -25.394536929), (103.191342951, -27.443575035))
        make_face()
    extrude(amount=-CUT_EXTRUDE4_DEPTH, mode=Mode.SUBTRACT)


solid = part.part
